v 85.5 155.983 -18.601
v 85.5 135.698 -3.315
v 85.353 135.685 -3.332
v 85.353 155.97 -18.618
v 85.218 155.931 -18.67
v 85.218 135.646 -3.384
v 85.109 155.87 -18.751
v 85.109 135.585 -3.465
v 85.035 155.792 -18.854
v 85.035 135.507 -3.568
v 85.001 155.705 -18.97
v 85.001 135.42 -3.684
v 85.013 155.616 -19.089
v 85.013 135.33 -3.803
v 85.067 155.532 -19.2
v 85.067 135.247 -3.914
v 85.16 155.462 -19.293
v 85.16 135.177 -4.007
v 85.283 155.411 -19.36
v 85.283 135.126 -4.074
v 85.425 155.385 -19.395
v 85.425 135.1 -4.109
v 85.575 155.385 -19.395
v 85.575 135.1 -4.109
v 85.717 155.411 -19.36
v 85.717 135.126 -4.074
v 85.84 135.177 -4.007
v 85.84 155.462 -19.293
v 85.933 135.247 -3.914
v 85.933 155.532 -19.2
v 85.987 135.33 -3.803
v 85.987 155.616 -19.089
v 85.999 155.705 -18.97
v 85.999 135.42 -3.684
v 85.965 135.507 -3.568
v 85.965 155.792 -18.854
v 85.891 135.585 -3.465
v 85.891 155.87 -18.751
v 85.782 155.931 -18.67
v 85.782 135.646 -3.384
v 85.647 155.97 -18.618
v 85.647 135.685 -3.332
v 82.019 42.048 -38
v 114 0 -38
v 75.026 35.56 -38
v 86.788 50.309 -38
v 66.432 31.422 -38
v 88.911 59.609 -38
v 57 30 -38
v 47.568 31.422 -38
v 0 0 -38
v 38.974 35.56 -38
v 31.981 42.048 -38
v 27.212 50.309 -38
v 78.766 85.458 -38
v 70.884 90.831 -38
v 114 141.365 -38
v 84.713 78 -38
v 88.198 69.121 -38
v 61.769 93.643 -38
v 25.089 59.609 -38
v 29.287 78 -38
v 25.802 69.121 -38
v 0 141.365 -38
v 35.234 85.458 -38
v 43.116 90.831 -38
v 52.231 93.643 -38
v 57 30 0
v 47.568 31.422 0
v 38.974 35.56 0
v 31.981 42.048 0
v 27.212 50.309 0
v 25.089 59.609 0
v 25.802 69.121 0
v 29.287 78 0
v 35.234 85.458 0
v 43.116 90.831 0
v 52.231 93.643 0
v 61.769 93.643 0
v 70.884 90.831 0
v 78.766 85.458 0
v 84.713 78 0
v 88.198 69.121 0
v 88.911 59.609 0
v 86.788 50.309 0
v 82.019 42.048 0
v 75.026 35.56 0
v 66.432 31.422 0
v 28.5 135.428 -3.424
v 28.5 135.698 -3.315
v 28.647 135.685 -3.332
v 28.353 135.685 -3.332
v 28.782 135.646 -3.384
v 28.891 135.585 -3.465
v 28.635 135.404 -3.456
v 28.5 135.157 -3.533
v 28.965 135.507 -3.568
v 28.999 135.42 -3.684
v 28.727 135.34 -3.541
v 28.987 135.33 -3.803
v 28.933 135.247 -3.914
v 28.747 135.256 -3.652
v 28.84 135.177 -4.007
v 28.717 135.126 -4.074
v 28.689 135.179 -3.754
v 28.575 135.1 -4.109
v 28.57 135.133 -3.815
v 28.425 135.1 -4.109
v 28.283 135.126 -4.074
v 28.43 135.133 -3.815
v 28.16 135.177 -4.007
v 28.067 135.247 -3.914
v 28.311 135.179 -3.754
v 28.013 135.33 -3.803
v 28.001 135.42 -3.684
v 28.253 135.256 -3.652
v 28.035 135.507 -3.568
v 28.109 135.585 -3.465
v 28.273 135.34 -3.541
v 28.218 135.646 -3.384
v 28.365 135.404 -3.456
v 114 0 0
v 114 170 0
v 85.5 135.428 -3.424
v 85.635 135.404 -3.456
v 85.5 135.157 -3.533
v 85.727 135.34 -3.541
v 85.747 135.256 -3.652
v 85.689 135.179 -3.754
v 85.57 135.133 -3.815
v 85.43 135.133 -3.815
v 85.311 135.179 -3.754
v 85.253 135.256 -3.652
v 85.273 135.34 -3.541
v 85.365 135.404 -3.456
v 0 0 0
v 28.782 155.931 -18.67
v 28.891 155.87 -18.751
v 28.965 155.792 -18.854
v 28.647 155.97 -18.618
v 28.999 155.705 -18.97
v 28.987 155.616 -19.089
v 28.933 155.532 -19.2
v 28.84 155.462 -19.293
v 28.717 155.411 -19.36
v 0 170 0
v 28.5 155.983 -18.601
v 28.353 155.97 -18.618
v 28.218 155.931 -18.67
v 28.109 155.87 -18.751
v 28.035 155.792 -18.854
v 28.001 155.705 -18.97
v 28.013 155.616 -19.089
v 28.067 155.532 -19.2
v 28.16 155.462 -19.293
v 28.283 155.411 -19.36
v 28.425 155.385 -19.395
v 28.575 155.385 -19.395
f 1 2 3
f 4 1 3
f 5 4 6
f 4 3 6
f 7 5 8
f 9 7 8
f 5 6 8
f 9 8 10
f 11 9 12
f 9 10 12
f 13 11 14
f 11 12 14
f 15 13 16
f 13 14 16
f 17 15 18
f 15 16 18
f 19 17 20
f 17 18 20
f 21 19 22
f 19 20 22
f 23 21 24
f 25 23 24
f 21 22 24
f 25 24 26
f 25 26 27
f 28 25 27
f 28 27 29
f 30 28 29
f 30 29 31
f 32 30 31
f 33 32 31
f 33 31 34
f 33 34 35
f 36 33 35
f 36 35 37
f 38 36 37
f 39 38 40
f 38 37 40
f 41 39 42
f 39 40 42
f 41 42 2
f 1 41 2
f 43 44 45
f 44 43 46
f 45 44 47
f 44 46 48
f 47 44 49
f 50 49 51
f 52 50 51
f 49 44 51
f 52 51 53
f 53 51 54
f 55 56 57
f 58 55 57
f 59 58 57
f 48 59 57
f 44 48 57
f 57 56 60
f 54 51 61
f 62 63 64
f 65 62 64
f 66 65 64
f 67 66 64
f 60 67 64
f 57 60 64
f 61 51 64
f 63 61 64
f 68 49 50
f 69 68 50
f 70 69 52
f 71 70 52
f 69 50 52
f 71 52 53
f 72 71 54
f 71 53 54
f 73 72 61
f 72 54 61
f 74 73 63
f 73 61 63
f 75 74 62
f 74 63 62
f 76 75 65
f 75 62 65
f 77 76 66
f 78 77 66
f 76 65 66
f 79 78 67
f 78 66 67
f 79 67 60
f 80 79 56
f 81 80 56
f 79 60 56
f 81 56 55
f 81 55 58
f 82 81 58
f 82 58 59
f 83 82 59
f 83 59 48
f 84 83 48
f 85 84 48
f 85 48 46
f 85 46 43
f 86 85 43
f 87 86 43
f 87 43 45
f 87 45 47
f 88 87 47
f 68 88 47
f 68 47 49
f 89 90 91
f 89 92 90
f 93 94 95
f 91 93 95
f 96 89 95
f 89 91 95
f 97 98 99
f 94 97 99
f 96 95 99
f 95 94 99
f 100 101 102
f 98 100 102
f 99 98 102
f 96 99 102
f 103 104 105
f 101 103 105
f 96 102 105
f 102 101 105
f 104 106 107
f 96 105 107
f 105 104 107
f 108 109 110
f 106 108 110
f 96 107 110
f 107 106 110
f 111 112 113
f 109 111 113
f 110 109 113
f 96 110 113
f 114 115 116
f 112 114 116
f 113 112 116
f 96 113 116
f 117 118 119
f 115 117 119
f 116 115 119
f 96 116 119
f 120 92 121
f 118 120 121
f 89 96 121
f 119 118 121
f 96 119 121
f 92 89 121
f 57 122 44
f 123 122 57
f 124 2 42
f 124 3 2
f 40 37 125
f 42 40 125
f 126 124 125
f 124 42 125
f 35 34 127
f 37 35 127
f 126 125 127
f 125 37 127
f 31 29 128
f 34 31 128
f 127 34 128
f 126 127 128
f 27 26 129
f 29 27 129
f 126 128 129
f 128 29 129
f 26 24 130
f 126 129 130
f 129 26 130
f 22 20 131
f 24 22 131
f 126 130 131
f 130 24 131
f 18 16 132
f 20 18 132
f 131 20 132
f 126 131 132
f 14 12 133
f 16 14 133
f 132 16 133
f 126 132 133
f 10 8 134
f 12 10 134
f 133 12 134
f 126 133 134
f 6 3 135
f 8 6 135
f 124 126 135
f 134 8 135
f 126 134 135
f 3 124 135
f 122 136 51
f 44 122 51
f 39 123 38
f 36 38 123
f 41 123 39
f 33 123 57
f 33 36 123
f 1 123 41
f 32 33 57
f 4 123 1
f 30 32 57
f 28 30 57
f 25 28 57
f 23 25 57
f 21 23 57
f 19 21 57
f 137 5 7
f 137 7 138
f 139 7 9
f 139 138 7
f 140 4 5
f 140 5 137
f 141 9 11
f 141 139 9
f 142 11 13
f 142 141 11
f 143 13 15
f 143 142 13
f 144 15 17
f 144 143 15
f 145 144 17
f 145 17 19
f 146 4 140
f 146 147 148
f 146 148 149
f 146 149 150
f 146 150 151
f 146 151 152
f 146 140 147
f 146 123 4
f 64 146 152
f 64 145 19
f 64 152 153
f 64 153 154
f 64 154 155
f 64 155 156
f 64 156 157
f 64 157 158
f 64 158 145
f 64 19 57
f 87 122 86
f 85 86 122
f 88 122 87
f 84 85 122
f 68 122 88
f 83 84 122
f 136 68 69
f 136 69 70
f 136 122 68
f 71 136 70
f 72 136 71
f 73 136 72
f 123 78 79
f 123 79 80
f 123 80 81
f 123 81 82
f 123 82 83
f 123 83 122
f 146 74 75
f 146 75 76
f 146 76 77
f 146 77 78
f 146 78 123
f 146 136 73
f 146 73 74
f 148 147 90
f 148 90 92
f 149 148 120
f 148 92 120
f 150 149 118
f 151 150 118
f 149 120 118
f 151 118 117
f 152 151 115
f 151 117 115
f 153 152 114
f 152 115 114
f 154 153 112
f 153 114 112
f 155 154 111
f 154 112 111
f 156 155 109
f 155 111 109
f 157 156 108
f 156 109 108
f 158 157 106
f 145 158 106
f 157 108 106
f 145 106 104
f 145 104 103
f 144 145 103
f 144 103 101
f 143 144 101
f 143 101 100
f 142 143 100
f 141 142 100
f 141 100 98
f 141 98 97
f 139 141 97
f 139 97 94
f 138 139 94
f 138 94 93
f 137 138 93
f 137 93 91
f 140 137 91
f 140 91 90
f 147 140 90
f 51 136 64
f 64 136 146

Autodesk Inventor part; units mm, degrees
ref_plane "YZ Plane" through (0, 0, 0) normal (1, 0, 0) x (0, 1, 0)
ref_plane "XZ Plane" through (0, 0, 0) normal (0, 1, 0) x (-1, 0, 0)
ref_plane "XY Plane" through (0, 0, 0) normal (0, 0, 1) x (1, 0, 0)
sketch "Sketch1" plane through (0, 0, 0) normal (1, 0, 0) x (0, 1, 0)
  line L0 (0, 0) -> (170, 0)
  line L1 (0, 0) -> (0, -38)
  line L2 (170, 0) -> (141.3649, -38)
  line L3 (170, 0) -> (170.6921, 0) construction
  line L4 (0, -38) -> (141.3649, -38)
  dimension "d2" = 170
  dimension "d4" = 38
  dimension "d26" = 127
extrude "Extrusion1" add sketch "Sketch1" along normal blind 114
sketch "Sketch4" plane through (0, 170, 0) normal (0, 0.7986, -0.6018) x (1, 0, 0)
  line L0 (0, 47.5812) -> (114, 47.5812) projected
  circle A0 centre (85.5, 23.7906) radius 2.921
  line L1 (0, 0) -> (0, 47.5812) projected
  line L2 (0, 0) -> (114, 0) projected
  line L3 (85.5, 23.7906) -> (28.5, 23.7906) construction
  line L4 (57, 47.5812) -> (57, 0) construction
  point P0 (0, 102.3086)
  point P1 (57, 23.7906)
  dimension "d30" = 57
  dimension "d42" = 28.5
hole "Hole2" at (28.5, 155.6825, -19) at (85.5, 155.6825, -19) direction (0, -0.7986, 0.6018) diameter 1 depth 25.4 tip angle 118
sketch "Sketch5" plane through (0, 0, 0) normal (0, 0, 1) x (1, 0, 0)
  line L0 (0, 170) -> (114, 170) projected
  circle A0 centre (57, 62) radius 32
  dimension "d44" = 64
  dimension "d45" = 108
hole "Hole3" at (57, 62, 0) direction (0, 0, -1) diameter 64 end through all
properties part number "2p4irsh" material "Wood (Cherry)"
